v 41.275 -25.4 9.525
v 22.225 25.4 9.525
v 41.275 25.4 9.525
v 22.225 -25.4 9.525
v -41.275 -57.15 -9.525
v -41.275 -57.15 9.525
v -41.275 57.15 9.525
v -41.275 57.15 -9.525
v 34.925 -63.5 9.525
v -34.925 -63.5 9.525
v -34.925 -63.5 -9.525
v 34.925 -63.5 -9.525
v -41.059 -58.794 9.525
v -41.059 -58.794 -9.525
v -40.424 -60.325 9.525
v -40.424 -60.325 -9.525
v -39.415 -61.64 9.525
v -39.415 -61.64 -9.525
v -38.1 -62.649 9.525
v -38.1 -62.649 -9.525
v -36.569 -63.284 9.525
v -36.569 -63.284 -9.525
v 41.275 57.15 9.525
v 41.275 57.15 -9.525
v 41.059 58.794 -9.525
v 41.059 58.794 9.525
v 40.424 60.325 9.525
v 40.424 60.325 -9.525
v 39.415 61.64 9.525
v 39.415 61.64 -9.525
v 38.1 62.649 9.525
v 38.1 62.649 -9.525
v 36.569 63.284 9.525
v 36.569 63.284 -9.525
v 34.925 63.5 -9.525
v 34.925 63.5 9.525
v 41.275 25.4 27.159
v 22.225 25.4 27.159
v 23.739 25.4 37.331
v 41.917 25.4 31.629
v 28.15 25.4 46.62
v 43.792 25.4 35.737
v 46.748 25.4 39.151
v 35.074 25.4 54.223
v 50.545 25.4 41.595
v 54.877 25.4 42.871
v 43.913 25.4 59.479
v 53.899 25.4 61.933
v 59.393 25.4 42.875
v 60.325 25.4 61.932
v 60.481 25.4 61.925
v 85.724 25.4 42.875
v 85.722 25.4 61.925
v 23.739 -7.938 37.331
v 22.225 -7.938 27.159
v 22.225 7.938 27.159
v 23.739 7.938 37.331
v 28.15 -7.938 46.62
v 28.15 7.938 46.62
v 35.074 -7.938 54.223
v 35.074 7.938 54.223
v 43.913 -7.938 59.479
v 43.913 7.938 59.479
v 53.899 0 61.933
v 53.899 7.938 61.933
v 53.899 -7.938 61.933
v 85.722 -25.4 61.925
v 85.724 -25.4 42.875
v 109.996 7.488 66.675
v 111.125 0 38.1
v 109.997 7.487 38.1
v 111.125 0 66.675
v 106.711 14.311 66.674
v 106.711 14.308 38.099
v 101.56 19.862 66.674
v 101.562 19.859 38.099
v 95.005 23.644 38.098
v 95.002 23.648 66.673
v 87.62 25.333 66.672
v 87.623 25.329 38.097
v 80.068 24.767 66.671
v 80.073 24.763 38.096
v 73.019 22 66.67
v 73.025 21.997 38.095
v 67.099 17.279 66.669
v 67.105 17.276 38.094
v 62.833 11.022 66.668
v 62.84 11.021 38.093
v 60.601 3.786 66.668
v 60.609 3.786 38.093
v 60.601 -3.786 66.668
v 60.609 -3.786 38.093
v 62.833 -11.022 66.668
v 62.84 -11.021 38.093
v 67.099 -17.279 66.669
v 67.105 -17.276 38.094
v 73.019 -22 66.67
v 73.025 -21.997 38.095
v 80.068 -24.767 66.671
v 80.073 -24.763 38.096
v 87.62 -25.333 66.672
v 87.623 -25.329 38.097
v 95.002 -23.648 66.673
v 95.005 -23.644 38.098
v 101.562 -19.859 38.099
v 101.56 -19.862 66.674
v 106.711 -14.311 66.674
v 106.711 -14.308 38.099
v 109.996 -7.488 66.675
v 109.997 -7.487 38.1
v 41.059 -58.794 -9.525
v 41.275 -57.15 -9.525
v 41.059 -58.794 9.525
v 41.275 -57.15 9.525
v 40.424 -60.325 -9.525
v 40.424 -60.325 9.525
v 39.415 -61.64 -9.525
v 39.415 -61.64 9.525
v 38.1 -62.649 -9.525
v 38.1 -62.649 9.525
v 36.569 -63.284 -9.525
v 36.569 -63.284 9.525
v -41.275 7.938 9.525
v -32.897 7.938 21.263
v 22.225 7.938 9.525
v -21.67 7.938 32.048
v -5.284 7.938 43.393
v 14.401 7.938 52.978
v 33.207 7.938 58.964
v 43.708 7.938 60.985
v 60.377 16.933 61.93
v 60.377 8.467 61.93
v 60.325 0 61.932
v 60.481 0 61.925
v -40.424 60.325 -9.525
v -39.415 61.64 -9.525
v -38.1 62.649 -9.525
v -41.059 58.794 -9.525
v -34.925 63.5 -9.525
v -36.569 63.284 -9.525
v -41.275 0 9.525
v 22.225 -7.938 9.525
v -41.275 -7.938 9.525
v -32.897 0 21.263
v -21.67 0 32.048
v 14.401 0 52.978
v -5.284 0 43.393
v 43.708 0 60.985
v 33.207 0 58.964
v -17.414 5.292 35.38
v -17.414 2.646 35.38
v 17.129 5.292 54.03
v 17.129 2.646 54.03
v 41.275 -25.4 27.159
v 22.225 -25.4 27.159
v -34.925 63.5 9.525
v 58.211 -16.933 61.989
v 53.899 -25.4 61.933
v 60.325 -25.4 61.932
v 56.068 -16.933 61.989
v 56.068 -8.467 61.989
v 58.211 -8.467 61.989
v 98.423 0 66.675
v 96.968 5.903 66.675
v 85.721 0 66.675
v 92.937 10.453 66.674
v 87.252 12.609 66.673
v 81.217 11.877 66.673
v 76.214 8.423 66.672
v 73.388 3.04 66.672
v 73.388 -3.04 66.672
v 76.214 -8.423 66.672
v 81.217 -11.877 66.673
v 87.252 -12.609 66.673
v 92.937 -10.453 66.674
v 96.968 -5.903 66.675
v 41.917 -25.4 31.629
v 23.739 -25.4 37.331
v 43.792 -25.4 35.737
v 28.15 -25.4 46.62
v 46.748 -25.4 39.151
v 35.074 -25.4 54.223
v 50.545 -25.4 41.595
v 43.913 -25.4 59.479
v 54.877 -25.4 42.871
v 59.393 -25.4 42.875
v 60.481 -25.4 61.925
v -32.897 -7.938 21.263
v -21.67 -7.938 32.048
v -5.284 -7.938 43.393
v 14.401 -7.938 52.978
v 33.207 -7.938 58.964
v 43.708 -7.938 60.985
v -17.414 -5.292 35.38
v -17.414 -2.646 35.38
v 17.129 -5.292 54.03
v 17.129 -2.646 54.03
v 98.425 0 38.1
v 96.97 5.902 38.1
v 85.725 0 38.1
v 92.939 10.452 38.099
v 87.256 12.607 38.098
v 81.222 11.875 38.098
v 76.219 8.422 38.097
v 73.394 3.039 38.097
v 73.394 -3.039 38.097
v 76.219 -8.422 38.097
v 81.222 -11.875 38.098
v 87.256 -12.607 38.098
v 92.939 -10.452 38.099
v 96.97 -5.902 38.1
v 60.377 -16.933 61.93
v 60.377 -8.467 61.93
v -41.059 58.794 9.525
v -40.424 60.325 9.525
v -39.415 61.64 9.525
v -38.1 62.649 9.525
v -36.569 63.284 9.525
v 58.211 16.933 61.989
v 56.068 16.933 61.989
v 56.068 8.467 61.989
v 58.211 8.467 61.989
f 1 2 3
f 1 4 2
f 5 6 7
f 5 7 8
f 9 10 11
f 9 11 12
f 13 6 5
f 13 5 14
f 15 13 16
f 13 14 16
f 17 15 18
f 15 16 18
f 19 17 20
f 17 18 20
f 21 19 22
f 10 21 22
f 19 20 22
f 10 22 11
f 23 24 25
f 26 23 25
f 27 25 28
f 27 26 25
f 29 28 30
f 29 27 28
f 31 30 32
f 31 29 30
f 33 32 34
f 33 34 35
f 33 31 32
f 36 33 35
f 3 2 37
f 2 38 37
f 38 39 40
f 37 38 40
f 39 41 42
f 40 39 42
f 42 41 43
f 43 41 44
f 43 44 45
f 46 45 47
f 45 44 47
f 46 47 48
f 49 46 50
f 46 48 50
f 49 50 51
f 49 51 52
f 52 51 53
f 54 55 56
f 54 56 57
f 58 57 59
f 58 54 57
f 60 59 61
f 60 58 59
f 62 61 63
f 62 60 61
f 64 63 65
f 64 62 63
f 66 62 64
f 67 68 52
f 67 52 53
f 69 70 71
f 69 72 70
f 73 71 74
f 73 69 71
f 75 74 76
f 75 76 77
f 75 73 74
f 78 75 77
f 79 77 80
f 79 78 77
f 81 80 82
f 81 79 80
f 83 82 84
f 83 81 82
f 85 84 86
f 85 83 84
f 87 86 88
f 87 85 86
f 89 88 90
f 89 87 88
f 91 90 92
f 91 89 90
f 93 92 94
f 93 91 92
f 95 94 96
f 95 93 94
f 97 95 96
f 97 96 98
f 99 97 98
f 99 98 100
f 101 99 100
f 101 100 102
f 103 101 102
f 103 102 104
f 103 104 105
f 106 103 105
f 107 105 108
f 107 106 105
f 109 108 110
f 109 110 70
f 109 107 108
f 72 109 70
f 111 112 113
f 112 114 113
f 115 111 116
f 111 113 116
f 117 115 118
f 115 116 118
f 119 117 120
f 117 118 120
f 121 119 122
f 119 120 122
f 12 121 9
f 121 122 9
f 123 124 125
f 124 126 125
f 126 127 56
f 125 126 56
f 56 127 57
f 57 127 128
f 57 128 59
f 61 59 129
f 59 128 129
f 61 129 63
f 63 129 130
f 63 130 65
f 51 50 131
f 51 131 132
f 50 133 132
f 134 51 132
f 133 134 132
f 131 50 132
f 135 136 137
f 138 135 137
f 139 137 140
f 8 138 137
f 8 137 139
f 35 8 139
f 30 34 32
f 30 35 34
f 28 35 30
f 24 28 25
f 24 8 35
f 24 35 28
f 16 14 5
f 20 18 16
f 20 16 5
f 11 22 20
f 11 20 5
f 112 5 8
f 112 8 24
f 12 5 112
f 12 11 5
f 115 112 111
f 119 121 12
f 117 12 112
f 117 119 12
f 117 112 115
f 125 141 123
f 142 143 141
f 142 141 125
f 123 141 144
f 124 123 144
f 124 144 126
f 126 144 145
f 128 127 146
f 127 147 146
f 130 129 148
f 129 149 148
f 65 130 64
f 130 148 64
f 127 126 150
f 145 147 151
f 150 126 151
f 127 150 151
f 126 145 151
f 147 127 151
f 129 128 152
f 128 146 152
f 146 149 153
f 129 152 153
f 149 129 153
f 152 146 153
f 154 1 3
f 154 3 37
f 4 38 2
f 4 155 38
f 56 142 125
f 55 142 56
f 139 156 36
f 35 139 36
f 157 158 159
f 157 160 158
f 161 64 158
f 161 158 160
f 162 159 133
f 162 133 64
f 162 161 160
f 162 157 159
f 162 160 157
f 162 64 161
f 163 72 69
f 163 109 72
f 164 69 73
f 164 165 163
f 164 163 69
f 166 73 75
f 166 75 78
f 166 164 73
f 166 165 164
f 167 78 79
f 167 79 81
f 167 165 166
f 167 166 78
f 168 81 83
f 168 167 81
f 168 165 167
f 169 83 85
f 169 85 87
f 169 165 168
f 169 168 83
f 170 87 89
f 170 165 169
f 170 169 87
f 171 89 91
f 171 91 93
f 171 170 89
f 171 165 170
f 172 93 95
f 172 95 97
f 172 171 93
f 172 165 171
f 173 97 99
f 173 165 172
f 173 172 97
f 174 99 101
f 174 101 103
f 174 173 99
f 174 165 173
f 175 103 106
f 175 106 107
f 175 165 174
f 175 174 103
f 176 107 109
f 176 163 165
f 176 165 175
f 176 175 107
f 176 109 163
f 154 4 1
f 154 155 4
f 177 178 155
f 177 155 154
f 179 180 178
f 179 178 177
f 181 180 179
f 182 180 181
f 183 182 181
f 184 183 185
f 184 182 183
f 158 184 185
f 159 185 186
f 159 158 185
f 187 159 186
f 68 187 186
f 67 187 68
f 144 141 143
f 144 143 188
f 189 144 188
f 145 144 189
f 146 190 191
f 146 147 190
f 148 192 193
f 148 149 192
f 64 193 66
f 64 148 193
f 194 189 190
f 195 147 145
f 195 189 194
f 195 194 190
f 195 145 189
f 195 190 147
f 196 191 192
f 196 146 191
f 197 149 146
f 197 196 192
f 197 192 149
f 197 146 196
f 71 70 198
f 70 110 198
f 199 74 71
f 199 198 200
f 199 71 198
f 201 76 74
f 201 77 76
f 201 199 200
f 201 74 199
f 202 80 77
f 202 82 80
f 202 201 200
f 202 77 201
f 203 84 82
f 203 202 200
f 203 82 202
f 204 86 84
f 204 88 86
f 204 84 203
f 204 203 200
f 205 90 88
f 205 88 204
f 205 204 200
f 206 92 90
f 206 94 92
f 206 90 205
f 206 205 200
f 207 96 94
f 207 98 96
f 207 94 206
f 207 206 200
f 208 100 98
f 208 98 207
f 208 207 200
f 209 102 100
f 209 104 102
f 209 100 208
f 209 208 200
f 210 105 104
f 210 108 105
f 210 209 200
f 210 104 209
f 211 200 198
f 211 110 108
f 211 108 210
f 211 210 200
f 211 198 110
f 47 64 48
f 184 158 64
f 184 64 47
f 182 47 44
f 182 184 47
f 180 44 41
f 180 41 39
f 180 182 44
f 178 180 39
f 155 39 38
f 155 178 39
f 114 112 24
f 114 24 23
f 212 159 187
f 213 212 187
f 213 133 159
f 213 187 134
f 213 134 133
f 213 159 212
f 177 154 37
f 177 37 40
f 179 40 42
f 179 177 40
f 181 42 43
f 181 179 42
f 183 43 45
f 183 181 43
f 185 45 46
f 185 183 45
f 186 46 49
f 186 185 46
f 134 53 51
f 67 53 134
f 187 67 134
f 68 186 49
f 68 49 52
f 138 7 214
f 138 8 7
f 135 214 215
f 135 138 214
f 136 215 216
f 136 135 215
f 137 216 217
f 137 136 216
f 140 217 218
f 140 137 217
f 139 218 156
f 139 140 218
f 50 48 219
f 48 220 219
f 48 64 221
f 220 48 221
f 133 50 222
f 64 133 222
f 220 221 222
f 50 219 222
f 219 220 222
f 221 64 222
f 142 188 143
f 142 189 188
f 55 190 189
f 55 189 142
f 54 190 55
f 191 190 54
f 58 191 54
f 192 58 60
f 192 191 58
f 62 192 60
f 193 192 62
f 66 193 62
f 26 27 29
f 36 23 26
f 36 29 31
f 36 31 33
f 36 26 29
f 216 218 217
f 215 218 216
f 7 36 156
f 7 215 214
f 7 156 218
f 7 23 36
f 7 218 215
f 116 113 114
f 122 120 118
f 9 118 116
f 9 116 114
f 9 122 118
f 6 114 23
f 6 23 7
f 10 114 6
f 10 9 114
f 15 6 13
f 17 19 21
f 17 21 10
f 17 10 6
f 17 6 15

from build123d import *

# Parameters (mm, degrees)
F1_DEPTH = 63.5
F2_DEPTH = 7.9375
F3_DEPTH = 25.4
F5_R     = 6.35


with BuildPart() as f1:
    # F0 (on Front) → F1 (new body, symmetric)
    with BuildSketch(Plane.XZ):
        Polygon((41.275, -9.525), (41.275, 9.525), (22.225, 9.525), (-41.275, 9.525), (-41.275, -9.525), align=None)
    extrude(amount=F1_DEPTH, both=True)

    # F5
    f5_edges = [f1.edges().sort_by_distance(p)[0] for p in [
        (-41.275, -63.5, 0),
        (41.275, -63.5, 0),
        (41.275, 63.5, 0),
        (-41.275, 63.5, 0),
    ]]
    fillet(f5_edges, radius=F5_R)


with BuildPart() as f2:
    # F0 (on Front) → F2 (new body, symmetric)
    with BuildSketch(Plane.XZ):
        with BuildLine():
            Line((-41.275, 9.525), (22.225, 9.525))
            Line((22.225, 9.525), (22.225, 27.1594016492))
            ThreePointArc((22.225, 27.1594016492), (31.3306273777, 50.6778119354), (53.8994808814, 61.9328074424))
            add(Edge.make_bspline(
                [(-41.275, 9.525), (-25.5720066946, 37.8017577356), (18.8324201722, 60.5848298703), (53.8994808814, 61.9328074424)],
                knots=[0, 0, 0, 0, 107.5976264782, 107.5976264782, 107.5976264782, 107.5976264782], degree=3))
        make_face()
    extrude(amount=F2_DEPTH, both=True)


with BuildPart() as f3:
    # F0 (on Front) → F3 (new body, symmetric)
    with BuildSketch(Plane.XZ):
        with BuildLine():
            Line((22.225, 9.525), (41.275, 9.525))
            Line((41.275, 9.525), (41.275, 27.1594016492))
            ThreePointArc((41.275, 27.1594016492), (46.7477366788, 39.1514216124), (59.392611691, 42.8752))
            Line((59.392611691, 42.8752), (60.325, 42.8752))
            Line((60.325, 42.8752), (60.325, 61.9317360992))
            add(Edge.make_bspline(
                [(53.8994808814, 61.9328074424), (56.0804905793, 62.0166454402), (58.2253808503, 62.0175667651), (60.325, 61.9317360992)],
                knots=[107.5976264782, 107.5976264782, 107.5976264782, 107.5976264782, 114.2897033756, 114.2897033756, 114.2897033756, 114.2897033756], degree=3))
            ThreePointArc((53.8994808814, 61.9328074424), (31.3306273777, 50.6778119354), (22.225, 27.1594016492))
            Line((22.225, 27.1594016492), (22.225, 9.525))
        make_face()
        with BuildLine():
            Line((60.325, 61.9317360992), (60.325, 42.8752))
            Line((60.325, 42.8752), (85.7243504036, 42.8752))
            Line((85.7243504036, 42.8752), (85.7217589288, 61.9252))
            Line((85.7217589288, 61.9252), (60.4808992826, 61.9252))
            add(Edge.make_bspline(
                [(60.325, 61.9317360992), (60.3769942358, 61.9296106185), (60.4289607097, 61.9274319382), (60.4808992826, 61.9252)],
                knots=[114.2897033756, 114.2897033756, 114.2897033756, 114.2897033756, 114.4554236323, 114.4554236323, 114.4554236323, 114.4554236323], degree=3))
        make_face()
    extrude(amount=F3_DEPTH, both=True)


with BuildPart() as f4:
    # F0 (on Front) → F4 (revolve)
    with BuildSketch(Plane.XZ):
        Polygon((85.7217589288, 61.9252), (85.7243504036, 42.8752), (85.725, 38.1), (111.125, 38.1), (111.125, 66.675), (85.7211127877, 66.675), align=None)
    revolve(axis=Axis((85.7230563939, 0, 52.3875), (-0.0001360354, 0, 0.9999999907)))


solid = Compound([f1.part, f2.part, f3.part, f4.part])
